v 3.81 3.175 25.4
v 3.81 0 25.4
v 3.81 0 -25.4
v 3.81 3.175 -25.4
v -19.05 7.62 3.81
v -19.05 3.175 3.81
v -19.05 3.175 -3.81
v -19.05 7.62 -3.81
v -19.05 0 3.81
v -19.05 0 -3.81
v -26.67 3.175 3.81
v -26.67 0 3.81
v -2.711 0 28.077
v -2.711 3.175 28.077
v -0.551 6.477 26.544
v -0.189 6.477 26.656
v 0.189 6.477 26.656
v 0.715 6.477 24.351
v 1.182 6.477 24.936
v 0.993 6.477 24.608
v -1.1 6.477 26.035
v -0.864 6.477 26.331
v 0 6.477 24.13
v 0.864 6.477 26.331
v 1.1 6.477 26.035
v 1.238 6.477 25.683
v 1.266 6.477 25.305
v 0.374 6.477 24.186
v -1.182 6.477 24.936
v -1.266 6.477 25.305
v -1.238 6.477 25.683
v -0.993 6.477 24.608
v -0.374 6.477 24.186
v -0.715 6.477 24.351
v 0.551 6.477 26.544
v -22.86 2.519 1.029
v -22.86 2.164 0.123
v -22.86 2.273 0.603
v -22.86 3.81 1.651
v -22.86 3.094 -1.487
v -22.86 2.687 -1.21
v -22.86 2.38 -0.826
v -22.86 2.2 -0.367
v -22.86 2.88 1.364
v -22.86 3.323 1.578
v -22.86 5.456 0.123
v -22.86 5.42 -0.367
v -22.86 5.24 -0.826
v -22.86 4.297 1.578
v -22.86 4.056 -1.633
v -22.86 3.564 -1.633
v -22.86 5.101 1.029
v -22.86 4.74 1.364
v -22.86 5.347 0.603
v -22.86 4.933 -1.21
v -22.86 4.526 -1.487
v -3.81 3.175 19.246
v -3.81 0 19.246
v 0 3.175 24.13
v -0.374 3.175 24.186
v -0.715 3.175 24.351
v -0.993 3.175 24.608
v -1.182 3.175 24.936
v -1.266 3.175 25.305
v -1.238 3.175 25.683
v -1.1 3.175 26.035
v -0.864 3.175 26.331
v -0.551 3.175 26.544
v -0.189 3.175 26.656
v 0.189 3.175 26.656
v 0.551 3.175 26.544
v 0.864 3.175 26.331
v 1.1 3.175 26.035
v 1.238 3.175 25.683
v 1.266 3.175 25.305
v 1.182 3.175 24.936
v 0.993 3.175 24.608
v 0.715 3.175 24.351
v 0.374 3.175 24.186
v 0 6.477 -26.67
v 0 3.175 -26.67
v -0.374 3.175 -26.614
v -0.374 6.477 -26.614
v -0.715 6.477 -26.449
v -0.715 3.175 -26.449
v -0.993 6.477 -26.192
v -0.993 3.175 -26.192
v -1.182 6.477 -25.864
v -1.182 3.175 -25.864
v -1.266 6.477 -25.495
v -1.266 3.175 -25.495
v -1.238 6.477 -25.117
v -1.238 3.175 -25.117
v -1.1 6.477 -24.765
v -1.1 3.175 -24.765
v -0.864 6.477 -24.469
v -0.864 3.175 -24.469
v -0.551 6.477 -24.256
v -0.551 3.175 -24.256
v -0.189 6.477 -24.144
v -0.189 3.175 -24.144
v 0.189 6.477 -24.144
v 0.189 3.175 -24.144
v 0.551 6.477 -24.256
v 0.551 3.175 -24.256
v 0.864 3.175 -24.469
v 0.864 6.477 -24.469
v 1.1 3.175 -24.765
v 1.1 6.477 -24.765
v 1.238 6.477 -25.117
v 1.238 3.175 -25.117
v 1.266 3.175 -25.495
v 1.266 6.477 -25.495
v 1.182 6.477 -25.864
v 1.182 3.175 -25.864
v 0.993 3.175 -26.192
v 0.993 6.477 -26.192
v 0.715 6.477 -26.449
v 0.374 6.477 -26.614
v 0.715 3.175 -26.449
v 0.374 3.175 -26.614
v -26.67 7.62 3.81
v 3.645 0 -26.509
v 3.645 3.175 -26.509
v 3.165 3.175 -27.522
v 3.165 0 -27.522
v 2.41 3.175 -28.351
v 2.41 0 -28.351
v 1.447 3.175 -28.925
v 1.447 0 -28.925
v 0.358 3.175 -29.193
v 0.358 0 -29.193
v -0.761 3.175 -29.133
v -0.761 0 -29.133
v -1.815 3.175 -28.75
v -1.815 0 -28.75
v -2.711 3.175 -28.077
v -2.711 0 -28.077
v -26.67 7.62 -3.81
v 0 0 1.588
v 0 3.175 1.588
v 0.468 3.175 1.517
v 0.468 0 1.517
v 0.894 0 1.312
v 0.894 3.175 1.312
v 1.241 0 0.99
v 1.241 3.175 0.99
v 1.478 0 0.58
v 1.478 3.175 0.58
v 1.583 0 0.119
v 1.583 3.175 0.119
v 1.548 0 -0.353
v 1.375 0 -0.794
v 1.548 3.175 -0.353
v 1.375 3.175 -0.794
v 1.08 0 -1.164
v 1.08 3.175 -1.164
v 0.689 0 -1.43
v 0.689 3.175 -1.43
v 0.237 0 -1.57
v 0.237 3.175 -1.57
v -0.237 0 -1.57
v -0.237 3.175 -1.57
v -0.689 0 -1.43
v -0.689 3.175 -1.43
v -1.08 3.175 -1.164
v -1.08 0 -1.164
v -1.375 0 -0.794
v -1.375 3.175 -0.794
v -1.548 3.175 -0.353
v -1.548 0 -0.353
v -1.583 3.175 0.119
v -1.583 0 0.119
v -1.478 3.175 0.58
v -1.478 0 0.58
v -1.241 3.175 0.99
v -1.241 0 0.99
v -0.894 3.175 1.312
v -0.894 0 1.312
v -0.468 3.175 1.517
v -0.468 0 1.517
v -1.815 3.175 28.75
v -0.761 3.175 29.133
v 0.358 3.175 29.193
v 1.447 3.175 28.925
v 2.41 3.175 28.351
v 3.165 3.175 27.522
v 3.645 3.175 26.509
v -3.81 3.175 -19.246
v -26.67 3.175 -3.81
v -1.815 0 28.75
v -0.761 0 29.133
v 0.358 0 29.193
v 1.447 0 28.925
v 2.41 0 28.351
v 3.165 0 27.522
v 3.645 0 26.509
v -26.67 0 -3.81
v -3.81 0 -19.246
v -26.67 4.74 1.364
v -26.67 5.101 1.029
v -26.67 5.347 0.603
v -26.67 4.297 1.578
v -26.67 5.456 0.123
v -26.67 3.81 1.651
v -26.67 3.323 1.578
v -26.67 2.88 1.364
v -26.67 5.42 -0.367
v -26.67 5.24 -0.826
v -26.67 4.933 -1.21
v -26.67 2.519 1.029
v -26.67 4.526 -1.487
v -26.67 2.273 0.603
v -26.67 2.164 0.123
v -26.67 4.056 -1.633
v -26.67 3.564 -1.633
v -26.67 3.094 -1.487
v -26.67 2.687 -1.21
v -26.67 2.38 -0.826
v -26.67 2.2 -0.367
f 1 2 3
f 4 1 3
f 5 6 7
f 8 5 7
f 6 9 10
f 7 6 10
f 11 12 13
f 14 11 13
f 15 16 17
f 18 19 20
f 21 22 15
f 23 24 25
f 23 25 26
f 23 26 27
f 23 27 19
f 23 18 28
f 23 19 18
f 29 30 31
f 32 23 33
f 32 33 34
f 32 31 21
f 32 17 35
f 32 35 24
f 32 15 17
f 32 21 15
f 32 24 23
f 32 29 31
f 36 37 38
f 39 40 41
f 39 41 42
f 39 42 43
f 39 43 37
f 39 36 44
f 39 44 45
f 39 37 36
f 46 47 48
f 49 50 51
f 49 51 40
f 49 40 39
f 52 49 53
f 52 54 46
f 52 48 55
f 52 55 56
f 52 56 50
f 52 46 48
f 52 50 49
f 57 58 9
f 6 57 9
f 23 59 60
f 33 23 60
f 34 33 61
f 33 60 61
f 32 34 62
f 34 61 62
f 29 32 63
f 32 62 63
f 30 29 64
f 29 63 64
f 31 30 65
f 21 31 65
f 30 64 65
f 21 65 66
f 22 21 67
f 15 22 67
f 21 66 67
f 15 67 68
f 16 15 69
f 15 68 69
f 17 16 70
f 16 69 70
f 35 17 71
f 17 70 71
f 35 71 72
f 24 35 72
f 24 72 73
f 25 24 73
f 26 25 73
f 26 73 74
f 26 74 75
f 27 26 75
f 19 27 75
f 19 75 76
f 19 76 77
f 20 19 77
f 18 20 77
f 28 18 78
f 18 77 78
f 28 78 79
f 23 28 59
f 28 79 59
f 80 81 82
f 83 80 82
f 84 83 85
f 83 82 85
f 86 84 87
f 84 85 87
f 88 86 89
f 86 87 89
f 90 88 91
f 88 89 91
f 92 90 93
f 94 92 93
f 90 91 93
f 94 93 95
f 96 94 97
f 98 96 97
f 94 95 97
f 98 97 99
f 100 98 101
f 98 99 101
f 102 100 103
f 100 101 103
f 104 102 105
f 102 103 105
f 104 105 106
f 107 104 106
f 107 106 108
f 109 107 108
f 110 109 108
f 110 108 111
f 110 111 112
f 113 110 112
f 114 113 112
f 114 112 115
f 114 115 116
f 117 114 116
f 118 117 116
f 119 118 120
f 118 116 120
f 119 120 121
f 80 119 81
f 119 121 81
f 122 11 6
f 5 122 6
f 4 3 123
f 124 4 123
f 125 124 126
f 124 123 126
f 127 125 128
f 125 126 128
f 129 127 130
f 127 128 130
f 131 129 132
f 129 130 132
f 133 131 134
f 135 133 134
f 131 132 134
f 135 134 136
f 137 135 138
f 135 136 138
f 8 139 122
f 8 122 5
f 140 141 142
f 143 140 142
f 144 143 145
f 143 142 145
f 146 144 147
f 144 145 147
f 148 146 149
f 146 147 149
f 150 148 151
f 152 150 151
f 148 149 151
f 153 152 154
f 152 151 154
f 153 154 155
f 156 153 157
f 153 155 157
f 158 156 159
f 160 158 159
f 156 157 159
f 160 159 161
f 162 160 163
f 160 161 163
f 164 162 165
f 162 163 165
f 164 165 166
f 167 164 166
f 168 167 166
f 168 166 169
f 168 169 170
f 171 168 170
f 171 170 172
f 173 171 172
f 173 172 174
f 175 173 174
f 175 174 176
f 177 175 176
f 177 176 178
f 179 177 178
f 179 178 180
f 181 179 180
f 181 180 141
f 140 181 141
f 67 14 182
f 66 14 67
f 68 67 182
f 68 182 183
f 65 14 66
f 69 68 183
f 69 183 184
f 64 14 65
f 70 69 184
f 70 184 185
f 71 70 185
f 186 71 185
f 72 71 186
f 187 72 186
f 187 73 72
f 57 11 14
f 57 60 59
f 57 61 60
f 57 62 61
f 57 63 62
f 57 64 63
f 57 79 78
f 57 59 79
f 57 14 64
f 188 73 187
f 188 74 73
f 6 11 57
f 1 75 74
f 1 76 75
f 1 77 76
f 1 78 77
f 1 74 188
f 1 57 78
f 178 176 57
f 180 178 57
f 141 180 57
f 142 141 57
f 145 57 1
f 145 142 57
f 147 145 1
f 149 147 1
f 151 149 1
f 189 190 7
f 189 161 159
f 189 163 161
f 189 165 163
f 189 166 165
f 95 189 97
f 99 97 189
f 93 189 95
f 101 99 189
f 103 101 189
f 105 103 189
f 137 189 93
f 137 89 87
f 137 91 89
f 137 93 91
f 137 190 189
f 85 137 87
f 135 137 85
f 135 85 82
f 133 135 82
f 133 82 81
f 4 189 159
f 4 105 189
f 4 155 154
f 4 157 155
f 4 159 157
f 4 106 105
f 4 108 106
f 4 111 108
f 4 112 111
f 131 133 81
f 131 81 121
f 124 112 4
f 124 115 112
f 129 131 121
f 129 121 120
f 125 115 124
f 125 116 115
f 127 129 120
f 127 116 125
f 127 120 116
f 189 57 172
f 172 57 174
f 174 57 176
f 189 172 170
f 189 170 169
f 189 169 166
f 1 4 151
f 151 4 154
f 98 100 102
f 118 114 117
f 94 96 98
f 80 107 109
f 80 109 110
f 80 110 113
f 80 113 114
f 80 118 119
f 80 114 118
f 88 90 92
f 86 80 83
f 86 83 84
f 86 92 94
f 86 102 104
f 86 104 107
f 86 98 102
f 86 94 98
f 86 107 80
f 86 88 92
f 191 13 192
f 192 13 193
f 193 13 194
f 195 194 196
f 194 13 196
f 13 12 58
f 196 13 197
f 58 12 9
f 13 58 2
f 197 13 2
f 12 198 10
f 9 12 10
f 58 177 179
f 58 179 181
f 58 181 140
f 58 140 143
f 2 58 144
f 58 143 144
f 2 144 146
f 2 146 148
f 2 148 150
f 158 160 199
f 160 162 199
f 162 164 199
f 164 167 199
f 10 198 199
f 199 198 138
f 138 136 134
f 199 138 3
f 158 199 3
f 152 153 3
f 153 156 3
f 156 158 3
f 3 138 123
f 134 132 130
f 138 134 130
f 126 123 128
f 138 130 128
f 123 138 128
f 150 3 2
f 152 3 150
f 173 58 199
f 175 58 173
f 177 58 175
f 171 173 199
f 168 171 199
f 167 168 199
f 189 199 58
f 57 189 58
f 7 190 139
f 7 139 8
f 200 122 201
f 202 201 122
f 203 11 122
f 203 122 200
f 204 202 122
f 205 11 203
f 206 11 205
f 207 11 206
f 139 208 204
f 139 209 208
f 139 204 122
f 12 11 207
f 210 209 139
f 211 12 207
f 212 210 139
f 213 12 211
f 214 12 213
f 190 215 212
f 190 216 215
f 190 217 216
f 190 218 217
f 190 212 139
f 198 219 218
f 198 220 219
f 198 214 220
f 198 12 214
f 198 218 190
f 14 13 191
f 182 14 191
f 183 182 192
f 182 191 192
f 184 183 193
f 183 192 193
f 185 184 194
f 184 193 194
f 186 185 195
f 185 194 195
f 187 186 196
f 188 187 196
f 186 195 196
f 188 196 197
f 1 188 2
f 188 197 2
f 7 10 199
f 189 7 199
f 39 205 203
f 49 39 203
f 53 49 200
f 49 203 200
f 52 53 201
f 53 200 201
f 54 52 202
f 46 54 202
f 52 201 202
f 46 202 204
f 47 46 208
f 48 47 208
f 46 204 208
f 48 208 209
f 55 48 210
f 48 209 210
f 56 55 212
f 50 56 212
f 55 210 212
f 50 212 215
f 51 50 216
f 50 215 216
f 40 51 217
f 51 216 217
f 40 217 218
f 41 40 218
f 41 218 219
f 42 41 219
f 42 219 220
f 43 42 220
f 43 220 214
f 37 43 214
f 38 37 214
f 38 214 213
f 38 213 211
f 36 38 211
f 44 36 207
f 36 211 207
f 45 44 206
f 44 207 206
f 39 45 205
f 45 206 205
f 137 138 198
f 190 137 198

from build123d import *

# Parameters (mm, degrees)
BOSS_EXTRUDE4_DEPTH = 3.175
SKETCH11_W          = 7.62
SKETCH11_H          = 7.62
BOSS_EXTRUDE5_DEPTH = 7.62
SKETCH13_R          = 1.27
BOSS_EXTRUDE6_DEPTH = 3.302
CUT_EXTRUDE3_REACH  = 41.803
SKETCH14_R          = 1.5875
SKETCH16_R          = 1.651
CUT_EXTRUDE4_DEPTH  = 3.81


with BuildPart() as part:
    # Sketch10 → Boss-Extrude4 (new body)
    with BuildSketch(Plane(origin=(0, 0, 0), x_dir=(1, 0, 0), z_dir=(0, 1, 0))):
        with BuildLine():
            Line((-3.81, 19.245944402), (-3.81, -19.245944402))
            Line((-3.81, -19.245944402), (-19.05, -3.81))
            Line((-19.05, -3.81), (-26.67, -3.81))
            Line((-26.67, -3.81), (-2.711230101, -28.076813654))
            ThreePointArc((-2.711230101, -28.076813654), (1.44677457, -28.924619603), (3.81, -25.4))
            Line((3.81, -25.4), (3.81, 25.4))
            ThreePointArc((3.81, 25.4), (1.44677457, 28.924619603), (-2.711230101, 28.076813654))
            Line((-2.711230101, 28.076813654), (-26.67, 3.81))
            Line((-26.67, 3.81), (-19.05, 3.81))
            Line((-19.05, 3.81), (-3.81, 19.245944402))
        make_face()
    extrude(amount=BOSS_EXTRUDE4_DEPTH)

    # Sketch11 → Boss-Extrude5 (add)
    with BuildSketch(Plane(origin=(0, 0, 0), x_dir=(1, 0, 0), z_dir=(0, 1, 0))):
        with Locations((-22.86, 0)):
            Rectangle(SKETCH11_W, SKETCH11_H)
    extrude(amount=BOSS_EXTRUDE5_DEPTH)

    # Sketch13 → Boss-Extrude6 (add)
    with BuildSketch(Plane(origin=(0, 3.175, 0), x_dir=(1, 0, 0), z_dir=(0, 1, 0))):
        with Locations(Location((0, -25.4, 0), (0, 0, 90))):
            Circle(SKETCH13_R)
        with Locations(Location((0, 25.4, 0), (0, 0, 90))):
            Circle(SKETCH13_R)
    extrude(amount=BOSS_EXTRUDE6_DEPTH)

    # Sketch14 → Cut-Extrude3 (cut, up to next)
    with BuildSketch(Plane(origin=(0, 3.175, 0), x_dir=(1, 0, 0), z_dir=(0, 1, 0)), mode=Mode.PRIVATE) as cut_extrude3_sk1:
        with Locations(Location((0, 0, 0), (0, 0, 270))):
            Circle(SKETCH14_R)
    cut_extrude3_tool1 = extrude(cut_extrude3_sk1.sketch, amount=-CUT_EXTRUDE3_REACH, mode=Mode.PRIVATE) & part.part
    add(cut_extrude3_tool1.solids().sort_by_distance((0, 3.175, 0))[0], mode=Mode.SUBTRACT)

    # Sketch16 → Cut-Extrude4 (cut)
    with BuildSketch(Plane.ZY.offset(26.67)):
        with Locations((0, 3.81)):
            Circle(SKETCH16_R)
    extrude(amount=-CUT_EXTRUDE4_DEPTH, mode=Mode.SUBTRACT)


solid = part.part
